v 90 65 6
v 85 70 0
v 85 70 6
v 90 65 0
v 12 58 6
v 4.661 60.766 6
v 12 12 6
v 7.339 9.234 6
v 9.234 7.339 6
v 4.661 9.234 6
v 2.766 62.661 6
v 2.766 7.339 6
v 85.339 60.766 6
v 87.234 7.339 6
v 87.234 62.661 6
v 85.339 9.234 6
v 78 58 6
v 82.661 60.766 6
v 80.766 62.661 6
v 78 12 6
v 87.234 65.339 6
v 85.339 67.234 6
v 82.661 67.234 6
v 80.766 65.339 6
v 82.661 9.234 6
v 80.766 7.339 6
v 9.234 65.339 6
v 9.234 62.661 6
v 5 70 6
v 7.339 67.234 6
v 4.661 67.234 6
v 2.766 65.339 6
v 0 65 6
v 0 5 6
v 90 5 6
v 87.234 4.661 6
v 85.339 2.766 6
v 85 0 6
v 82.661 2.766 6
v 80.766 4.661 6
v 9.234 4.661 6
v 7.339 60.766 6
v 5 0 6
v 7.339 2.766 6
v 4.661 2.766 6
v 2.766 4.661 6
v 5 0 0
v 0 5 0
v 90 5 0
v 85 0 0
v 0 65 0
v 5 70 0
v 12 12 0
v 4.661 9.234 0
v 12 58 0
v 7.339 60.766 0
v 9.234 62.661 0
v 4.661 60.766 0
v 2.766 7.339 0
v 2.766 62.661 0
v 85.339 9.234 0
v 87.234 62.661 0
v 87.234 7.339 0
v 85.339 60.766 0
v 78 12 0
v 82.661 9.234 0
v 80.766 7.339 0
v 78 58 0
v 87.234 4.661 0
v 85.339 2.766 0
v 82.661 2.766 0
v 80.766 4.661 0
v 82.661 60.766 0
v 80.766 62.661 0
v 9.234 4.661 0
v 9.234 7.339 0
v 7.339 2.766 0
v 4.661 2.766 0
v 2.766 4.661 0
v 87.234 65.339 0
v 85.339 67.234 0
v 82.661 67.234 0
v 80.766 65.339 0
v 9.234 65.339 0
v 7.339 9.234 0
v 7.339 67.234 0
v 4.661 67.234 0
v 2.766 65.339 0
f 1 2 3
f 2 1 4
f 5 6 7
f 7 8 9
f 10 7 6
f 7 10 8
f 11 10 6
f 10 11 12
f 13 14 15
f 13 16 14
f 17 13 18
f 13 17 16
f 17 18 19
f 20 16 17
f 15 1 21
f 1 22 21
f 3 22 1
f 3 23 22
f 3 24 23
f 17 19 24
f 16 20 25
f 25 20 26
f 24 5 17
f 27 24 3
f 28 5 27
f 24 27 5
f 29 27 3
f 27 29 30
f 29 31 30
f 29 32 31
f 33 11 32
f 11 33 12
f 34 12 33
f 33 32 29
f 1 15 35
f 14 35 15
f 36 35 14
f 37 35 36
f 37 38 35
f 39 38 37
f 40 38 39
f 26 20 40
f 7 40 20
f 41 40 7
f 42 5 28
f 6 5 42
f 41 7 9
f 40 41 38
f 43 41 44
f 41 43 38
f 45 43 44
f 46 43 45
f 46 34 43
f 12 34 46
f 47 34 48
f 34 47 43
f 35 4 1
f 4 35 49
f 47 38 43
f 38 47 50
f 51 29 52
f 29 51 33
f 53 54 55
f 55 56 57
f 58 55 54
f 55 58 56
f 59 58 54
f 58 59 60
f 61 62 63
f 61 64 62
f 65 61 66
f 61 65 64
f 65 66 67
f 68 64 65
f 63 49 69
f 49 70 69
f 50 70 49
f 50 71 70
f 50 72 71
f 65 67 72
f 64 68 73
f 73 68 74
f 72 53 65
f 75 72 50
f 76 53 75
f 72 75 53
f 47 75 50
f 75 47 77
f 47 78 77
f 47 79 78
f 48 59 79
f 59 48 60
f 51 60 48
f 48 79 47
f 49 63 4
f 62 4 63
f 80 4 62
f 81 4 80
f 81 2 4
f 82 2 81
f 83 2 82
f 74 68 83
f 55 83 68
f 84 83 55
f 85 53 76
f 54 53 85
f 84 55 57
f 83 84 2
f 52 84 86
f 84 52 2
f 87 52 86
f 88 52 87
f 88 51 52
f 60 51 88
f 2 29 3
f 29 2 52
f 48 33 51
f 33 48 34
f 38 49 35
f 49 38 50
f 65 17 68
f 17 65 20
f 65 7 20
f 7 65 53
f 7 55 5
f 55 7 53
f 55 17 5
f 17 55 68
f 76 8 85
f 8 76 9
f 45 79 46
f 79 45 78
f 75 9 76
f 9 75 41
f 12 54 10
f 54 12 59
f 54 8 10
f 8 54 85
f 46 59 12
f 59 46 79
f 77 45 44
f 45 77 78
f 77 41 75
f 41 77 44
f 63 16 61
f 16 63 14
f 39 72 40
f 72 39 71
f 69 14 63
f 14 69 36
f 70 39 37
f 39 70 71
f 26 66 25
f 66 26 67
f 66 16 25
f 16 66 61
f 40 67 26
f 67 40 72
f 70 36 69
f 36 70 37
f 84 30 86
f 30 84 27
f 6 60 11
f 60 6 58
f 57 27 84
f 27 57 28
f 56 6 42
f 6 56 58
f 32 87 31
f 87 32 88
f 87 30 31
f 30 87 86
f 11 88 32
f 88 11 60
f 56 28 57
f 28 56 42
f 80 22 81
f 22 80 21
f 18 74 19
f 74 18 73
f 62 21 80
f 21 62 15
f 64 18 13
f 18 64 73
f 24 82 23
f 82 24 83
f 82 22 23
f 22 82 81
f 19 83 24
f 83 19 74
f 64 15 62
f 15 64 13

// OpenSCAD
$fn = 32;

// ----------------------------------------------------------------------
// Frame plate: 90 x 70 frame, 12 mm rails
// ----------------------------------------------------------------------

// --- parameters (mm) ---
plate_l = 90;             // plate length, X
plate_w = 70;             // plate width, Y
plate_t = 6;              // plate thickness, Z (extrusion height)
corner_c = 5;             // corner chamfer
frame_bar = 12;           // frame rail width
bolt_r = 3.5;             // corner bolt window radius
bolt_inset = 6;           // bolt centre inset from the edges

win_l = plate_l - 2 * frame_bar;  // window length
win_w = plate_w - 2 * frame_bar;  // window width
bolt_d = 2 * bolt_r;  // corner hole diameter

profile = [[5, 0], [85, 0], [90, 5], [90, 65], [85, 70], [5, 70], [0, 65], [0, 5]];  // primary outline, 8 points, counter clockwise
void_1 = [[12, 12], [78, 12], [78, 58], [12, 58]];  // the window, 4 points
void_2 = [[9.234, 7.339], [7.339, 9.234], [4.661, 9.234], [2.766, 7.339], [2.766, 4.661], [4.661, 2.766], [7.339, 2.766], [9.234, 4.661]];  // corner bolt window, 8 points
void_3 = [[87.234, 7.339], [85.339, 9.234], [82.661, 9.234], [80.766, 7.339], [80.766, 4.661], [82.661, 2.766], [85.339, 2.766], [87.234, 4.661]];  // corner bolt window, 8 points
void_4 = [[9.234, 65.339], [7.339, 67.234], [4.661, 67.234], [2.766, 65.339], [2.766, 62.661], [4.661, 60.766], [7.339, 60.766], [9.234, 62.661]];  // corner bolt window, 8 points
void_5 = [[87.234, 65.339], [85.339, 67.234], [82.661, 67.234], [80.766, 65.339], [80.766, 62.661], [82.661, 60.766], [85.339, 60.766], [87.234, 62.661]];  // corner bolt window, 8 points

// --- the one profile operation ---
difference() {
  linear_extrude(height = plate_t) polygon(points = profile);
  translate([0, 0, -1])
    linear_extrude(height = plate_t + 2) polygon(points = void_1);
  translate([0, 0, -1])
    linear_extrude(height = plate_t + 2) polygon(points = void_2);
  translate([0, 0, -1])
    linear_extrude(height = plate_t + 2) polygon(points = void_3);
  translate([0, 0, -1])
    linear_extrude(height = plate_t + 2) polygon(points = void_4);
  translate([0, 0, -1])
    linear_extrude(height = plate_t + 2) polygon(points = void_5);
}
